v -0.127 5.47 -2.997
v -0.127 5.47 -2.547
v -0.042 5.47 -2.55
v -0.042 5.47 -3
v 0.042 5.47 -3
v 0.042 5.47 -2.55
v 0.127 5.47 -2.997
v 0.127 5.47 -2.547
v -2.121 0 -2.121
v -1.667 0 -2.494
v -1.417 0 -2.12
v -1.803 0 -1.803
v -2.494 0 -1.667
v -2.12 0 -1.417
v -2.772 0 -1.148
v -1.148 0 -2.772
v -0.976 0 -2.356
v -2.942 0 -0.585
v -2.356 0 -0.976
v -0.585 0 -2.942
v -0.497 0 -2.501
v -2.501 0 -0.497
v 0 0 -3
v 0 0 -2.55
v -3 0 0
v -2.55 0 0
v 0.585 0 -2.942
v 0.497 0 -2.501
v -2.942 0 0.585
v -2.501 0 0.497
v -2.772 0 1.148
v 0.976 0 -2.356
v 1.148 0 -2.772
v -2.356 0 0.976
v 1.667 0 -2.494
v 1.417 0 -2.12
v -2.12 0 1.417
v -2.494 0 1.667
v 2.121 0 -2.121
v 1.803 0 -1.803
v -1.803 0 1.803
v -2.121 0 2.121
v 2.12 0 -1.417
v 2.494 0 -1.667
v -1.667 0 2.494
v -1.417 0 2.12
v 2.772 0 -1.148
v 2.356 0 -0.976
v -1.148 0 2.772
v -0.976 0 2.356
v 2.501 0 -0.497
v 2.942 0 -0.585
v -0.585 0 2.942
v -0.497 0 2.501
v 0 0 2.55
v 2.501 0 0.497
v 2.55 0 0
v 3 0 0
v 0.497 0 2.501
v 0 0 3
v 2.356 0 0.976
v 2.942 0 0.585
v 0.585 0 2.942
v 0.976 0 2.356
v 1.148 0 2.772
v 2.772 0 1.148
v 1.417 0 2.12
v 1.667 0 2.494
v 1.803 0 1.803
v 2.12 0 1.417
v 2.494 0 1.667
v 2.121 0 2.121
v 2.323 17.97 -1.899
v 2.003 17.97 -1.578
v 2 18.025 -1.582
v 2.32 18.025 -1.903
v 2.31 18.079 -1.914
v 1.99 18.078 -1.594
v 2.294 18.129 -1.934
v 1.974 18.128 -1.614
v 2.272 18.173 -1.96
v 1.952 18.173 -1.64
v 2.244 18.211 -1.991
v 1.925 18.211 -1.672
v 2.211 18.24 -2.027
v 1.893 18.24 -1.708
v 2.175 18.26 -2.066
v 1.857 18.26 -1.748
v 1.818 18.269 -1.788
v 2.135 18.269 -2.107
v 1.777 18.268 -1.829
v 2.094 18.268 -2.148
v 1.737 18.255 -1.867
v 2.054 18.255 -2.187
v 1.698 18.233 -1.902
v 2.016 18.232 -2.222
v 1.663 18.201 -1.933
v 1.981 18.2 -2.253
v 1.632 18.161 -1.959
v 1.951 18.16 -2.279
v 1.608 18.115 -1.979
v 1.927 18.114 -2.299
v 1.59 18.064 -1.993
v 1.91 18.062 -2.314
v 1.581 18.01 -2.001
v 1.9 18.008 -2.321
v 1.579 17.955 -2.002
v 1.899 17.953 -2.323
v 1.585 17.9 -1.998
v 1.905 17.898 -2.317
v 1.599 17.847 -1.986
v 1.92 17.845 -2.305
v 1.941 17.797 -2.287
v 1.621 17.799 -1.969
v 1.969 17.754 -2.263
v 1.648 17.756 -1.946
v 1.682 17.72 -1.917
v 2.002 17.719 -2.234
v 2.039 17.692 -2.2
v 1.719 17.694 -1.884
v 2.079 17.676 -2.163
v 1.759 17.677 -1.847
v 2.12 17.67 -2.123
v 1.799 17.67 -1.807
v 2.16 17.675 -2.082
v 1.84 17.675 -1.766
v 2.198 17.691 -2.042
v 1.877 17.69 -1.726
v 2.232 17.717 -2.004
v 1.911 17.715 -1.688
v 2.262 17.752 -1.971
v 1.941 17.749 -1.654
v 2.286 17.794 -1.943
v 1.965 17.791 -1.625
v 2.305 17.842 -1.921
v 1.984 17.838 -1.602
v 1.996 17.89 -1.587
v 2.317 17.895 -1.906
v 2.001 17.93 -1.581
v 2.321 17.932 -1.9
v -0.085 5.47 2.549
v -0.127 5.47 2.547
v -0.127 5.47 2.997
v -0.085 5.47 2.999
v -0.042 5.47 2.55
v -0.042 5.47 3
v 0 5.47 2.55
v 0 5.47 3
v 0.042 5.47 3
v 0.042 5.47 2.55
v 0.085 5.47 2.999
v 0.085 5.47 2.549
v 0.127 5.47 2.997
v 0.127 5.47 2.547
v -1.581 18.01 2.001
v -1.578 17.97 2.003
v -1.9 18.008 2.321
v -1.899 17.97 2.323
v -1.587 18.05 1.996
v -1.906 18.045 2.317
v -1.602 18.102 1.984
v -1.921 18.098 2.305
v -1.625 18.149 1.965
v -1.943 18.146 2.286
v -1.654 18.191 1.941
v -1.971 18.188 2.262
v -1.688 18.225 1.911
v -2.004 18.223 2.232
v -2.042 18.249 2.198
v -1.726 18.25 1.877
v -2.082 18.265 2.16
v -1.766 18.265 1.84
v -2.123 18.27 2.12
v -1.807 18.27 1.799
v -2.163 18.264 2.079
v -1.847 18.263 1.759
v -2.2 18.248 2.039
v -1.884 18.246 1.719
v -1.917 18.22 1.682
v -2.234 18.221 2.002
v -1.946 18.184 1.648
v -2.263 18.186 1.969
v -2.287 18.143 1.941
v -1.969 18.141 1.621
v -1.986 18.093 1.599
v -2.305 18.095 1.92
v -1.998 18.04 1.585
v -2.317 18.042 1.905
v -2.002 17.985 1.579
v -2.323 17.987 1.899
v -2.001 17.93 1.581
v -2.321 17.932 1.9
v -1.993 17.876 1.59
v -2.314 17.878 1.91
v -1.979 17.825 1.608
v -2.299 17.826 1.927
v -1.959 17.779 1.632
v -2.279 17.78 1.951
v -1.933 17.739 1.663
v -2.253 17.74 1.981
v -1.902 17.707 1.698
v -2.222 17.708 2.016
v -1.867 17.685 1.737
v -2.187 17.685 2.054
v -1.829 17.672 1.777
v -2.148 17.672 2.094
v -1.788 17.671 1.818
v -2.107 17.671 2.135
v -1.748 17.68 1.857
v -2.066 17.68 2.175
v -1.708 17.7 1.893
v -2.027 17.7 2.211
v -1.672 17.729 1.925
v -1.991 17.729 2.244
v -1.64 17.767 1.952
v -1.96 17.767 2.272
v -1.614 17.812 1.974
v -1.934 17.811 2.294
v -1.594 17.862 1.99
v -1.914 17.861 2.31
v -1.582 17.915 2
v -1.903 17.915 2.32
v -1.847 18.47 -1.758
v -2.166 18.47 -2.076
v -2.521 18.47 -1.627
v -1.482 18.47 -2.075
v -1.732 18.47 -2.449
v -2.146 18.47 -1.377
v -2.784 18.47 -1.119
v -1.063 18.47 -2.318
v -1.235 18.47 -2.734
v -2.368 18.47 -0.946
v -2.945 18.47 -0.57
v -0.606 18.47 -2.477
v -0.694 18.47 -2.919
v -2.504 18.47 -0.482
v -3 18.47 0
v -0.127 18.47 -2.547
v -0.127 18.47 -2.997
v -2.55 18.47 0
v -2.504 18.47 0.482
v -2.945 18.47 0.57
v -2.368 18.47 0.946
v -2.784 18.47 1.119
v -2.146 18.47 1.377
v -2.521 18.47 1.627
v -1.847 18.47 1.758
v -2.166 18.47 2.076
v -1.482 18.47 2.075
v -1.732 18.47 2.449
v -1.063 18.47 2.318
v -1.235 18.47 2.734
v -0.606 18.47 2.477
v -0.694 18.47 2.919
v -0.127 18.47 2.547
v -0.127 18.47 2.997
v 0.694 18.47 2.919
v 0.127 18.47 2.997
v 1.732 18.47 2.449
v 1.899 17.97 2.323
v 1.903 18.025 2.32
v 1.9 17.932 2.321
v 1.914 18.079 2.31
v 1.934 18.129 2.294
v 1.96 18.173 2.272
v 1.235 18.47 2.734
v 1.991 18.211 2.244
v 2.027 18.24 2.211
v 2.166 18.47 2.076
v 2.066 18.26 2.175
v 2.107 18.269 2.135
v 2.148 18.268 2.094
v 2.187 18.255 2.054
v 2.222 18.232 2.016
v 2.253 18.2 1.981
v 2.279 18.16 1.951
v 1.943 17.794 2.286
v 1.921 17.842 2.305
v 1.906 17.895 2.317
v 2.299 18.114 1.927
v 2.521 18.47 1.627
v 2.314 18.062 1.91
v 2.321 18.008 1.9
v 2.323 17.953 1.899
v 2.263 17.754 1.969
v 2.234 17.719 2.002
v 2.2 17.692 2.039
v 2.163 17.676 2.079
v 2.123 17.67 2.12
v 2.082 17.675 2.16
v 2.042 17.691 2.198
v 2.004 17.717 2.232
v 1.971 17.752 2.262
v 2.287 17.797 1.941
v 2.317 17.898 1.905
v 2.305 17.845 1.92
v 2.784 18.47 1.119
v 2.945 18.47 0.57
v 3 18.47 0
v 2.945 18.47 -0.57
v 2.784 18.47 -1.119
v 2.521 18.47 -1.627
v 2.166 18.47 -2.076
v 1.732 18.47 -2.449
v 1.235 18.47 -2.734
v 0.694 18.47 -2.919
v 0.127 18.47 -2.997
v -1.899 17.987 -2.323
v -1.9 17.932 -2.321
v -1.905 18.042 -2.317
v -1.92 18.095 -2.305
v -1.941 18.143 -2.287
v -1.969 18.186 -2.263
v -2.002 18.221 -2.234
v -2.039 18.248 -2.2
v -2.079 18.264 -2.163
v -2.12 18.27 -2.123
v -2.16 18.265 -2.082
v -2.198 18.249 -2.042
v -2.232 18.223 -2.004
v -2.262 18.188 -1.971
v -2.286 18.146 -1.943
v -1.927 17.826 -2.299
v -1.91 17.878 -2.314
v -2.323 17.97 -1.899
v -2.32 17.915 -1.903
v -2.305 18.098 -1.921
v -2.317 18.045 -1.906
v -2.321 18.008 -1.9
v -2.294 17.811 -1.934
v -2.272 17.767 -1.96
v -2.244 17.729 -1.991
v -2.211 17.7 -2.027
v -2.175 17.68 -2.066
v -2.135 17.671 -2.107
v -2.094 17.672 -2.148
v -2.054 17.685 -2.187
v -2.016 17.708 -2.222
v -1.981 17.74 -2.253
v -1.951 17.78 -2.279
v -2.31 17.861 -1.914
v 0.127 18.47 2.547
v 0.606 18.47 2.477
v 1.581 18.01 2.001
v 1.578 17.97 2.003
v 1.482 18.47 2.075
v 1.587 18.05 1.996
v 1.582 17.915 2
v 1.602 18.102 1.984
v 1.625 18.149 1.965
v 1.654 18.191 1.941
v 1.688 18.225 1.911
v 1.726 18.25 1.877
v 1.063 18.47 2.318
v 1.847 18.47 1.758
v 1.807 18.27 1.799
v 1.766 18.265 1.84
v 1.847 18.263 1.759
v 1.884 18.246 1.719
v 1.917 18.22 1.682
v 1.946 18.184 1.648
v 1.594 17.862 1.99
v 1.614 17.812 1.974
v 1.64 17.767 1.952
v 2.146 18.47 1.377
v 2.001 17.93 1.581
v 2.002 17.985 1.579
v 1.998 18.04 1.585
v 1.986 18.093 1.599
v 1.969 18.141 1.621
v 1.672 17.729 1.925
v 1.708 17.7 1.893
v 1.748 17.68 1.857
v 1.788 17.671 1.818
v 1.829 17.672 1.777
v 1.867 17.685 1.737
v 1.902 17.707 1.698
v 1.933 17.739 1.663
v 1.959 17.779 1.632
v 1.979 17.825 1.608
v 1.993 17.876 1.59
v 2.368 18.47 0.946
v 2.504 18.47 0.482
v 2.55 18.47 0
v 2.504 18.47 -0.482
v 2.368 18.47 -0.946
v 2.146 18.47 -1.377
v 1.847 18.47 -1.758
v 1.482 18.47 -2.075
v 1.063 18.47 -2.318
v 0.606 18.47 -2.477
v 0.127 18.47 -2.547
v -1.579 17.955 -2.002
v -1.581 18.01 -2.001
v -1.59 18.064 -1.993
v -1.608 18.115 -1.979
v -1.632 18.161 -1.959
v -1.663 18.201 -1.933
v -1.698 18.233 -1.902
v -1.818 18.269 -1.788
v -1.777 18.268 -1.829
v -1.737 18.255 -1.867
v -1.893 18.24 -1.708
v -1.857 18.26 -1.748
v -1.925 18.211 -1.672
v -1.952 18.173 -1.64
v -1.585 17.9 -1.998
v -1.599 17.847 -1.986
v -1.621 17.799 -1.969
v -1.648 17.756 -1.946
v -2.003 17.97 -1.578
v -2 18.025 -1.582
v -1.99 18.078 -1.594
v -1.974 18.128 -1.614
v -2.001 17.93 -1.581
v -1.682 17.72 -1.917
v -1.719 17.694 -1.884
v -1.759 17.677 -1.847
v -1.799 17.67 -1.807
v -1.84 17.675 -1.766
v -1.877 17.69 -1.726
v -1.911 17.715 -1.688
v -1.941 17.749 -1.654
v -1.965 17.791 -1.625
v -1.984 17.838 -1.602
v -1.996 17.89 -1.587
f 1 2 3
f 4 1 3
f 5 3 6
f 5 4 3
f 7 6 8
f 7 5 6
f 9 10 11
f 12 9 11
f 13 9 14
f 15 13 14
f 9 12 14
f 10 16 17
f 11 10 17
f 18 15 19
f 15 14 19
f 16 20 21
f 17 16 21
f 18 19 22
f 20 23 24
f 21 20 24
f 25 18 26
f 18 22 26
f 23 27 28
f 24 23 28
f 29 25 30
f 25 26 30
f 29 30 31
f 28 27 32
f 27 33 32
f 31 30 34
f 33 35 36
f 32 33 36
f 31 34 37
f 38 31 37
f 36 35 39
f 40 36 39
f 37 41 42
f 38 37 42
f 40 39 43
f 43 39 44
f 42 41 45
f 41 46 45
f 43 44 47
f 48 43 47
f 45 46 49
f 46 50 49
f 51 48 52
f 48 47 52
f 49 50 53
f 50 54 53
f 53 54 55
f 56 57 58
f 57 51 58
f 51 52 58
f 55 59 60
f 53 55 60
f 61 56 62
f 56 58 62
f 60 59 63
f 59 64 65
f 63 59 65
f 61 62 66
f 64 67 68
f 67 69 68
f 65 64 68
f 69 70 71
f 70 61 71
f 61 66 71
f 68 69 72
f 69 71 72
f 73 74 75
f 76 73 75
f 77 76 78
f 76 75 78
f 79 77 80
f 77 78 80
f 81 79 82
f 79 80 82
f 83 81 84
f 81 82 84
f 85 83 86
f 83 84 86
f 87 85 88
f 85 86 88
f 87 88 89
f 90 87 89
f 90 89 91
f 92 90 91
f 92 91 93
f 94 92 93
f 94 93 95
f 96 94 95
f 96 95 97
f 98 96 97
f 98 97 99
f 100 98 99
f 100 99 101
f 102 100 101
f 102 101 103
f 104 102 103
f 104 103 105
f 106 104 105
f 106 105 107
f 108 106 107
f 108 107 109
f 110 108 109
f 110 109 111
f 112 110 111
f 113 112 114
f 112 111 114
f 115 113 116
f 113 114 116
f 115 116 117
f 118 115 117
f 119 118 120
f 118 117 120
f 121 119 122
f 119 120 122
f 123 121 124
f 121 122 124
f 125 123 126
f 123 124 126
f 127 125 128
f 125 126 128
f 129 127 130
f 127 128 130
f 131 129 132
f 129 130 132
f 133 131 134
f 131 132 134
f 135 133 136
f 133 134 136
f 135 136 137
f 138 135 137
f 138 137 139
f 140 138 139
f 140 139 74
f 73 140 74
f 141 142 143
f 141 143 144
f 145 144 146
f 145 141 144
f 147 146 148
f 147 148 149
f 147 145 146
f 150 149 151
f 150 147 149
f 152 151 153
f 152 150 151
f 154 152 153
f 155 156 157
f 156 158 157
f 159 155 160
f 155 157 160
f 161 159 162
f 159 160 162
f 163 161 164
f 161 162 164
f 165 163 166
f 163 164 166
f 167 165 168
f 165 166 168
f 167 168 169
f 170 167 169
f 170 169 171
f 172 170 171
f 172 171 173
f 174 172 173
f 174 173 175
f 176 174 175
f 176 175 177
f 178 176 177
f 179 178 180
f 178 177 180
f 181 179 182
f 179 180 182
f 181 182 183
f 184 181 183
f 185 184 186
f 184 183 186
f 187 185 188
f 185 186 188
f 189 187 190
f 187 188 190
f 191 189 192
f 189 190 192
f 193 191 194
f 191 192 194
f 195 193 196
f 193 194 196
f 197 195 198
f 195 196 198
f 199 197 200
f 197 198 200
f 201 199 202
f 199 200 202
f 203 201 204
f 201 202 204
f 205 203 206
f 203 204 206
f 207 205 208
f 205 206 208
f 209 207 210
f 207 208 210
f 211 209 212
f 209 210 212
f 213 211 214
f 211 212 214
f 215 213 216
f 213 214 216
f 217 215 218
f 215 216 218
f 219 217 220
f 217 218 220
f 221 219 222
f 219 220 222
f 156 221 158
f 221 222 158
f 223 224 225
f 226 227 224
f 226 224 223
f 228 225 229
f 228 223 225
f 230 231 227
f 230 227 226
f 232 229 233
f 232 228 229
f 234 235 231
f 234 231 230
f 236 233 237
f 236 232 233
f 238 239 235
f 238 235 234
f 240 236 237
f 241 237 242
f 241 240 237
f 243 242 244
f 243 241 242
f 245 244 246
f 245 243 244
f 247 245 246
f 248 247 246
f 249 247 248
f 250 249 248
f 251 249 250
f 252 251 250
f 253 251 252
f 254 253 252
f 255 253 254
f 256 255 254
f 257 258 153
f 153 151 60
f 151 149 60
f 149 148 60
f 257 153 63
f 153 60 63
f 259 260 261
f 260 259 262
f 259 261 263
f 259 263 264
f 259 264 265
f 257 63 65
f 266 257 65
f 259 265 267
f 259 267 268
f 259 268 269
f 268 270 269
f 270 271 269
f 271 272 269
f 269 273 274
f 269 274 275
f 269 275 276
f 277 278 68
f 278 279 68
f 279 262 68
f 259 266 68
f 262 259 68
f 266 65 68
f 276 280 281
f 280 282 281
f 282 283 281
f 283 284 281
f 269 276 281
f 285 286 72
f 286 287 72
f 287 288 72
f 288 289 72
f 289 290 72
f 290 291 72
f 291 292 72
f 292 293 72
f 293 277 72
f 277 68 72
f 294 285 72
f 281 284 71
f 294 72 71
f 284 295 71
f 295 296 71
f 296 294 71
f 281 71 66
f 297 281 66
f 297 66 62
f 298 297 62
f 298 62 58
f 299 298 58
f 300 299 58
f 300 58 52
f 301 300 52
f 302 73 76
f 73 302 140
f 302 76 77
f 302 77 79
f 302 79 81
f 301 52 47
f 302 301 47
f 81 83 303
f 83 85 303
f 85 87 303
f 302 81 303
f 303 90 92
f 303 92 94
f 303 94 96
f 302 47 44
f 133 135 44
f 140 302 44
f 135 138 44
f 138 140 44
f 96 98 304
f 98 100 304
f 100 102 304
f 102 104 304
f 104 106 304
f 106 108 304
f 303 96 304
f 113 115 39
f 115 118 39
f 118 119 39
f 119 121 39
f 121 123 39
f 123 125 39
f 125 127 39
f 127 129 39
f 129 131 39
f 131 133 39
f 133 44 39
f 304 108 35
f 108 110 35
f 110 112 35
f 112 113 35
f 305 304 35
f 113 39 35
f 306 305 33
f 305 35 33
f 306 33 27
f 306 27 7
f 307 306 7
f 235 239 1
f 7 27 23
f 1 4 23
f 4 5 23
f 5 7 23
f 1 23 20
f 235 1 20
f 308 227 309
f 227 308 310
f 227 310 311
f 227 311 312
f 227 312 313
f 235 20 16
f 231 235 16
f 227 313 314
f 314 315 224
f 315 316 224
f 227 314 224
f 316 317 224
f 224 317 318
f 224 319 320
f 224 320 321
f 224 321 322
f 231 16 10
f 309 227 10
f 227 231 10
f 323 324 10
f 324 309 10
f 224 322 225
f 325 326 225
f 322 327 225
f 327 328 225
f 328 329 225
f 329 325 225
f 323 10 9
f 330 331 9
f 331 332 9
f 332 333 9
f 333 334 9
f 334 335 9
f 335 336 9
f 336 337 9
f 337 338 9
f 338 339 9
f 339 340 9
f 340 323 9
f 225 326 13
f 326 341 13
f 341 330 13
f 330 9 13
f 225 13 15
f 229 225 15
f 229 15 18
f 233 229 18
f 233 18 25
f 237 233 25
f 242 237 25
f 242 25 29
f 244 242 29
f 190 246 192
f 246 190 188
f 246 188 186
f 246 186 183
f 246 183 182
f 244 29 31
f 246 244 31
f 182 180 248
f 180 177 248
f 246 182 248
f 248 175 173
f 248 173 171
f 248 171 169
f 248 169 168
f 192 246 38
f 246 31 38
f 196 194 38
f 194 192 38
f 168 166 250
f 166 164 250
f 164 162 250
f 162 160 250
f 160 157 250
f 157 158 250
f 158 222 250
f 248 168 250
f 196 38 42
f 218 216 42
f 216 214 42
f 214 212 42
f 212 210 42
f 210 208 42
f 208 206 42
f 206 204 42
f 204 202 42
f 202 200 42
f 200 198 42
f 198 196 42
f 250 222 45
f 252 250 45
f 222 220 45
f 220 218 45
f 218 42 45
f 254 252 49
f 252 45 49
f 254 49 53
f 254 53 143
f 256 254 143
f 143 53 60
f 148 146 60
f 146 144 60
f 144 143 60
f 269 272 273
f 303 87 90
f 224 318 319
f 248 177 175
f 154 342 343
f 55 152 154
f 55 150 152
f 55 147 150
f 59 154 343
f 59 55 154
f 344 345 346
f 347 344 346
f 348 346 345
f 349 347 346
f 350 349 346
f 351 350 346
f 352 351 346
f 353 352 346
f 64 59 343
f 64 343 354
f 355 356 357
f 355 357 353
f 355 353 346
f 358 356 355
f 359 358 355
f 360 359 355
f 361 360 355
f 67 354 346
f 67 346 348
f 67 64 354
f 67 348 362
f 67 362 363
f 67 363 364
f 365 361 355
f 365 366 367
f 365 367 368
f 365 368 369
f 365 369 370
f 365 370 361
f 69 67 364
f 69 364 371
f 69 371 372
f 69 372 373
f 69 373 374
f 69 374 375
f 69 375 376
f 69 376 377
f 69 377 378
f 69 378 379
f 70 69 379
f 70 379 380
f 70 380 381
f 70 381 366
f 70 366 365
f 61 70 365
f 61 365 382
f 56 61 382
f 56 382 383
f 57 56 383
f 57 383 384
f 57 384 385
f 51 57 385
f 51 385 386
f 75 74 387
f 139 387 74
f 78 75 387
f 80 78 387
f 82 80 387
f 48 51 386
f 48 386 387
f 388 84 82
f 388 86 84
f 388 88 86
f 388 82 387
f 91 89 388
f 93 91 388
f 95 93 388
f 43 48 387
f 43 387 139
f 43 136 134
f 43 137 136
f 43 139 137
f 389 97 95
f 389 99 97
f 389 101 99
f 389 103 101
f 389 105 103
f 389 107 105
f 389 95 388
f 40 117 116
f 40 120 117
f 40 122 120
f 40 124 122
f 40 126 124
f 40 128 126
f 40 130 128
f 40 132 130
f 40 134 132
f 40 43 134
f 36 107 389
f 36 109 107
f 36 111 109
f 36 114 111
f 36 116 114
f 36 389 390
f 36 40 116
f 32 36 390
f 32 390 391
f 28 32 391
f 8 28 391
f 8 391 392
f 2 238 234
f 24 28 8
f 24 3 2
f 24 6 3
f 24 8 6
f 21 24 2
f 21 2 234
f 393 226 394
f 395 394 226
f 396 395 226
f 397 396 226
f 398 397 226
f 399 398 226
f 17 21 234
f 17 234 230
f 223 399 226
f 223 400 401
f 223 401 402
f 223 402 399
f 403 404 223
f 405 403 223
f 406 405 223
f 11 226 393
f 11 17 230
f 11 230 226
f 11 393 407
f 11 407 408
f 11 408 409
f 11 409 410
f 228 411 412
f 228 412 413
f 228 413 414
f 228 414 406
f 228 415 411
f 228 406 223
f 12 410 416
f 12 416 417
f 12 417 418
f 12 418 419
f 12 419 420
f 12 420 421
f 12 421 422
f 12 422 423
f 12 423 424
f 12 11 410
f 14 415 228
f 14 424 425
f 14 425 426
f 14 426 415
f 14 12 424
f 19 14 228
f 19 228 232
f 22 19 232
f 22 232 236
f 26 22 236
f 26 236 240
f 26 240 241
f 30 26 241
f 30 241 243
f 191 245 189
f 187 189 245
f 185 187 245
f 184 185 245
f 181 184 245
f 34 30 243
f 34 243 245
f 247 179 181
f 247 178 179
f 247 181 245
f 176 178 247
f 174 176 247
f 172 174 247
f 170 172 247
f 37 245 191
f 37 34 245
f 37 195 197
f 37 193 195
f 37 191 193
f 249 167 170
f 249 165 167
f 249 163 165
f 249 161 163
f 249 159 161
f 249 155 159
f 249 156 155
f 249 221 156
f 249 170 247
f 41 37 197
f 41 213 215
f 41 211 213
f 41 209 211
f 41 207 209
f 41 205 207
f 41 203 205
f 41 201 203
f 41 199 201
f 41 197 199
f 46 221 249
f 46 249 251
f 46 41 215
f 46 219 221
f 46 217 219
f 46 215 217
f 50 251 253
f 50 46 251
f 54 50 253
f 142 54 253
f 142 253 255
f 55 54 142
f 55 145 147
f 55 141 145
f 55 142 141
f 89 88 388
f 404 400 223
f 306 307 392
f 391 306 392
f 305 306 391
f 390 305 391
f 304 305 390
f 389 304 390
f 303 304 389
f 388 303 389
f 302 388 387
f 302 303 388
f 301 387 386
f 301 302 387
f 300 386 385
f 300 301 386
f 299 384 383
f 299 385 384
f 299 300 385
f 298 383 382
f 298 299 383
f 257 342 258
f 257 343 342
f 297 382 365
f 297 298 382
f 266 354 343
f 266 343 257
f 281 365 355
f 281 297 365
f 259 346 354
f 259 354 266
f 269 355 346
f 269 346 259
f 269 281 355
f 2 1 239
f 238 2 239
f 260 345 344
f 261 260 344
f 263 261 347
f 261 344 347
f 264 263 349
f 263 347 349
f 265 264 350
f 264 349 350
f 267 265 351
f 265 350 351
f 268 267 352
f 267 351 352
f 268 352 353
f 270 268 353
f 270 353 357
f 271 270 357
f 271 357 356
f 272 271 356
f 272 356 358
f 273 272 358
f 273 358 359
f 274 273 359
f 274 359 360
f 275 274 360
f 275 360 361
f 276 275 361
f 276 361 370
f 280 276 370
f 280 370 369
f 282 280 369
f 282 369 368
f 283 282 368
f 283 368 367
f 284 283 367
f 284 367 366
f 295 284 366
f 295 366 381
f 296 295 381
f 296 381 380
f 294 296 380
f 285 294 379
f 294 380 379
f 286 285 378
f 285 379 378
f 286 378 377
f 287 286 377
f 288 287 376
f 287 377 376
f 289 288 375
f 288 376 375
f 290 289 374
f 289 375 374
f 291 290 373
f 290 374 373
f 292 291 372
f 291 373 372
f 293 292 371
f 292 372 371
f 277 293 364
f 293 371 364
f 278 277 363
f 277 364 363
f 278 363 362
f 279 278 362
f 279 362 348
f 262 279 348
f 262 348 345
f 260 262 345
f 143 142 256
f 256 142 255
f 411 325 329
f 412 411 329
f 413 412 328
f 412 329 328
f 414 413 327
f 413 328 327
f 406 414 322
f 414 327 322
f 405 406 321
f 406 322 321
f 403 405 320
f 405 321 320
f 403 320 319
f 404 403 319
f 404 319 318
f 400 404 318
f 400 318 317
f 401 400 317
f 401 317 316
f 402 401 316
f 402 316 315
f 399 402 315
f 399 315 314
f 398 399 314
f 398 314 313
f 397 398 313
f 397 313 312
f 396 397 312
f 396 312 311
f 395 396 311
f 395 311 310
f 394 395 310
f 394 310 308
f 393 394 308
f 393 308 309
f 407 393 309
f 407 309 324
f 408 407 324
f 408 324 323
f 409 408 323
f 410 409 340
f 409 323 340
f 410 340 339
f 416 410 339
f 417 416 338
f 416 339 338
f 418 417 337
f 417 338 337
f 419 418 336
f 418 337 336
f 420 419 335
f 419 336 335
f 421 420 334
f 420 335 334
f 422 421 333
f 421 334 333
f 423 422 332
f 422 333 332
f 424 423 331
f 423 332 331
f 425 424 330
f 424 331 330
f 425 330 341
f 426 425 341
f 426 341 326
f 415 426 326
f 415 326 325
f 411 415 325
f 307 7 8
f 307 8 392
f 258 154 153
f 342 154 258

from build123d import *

# Parameters (mm, degrees)
SKETCH1_R                            = 3
SKETCH1_R_2                          = 2.55
BOSS_EXTRUDE1_DEPTH                  = 18.47
CUT_EXTRUDE1_DEPTH                   = 19.951013166
CUT_EXTRUDE1_DEPTH_BACK              = 19.951013166
SKETCH2_W                            = 0.254
SKETCH2_H                            = 13
F_0_6_0_6_DIAMETER_HOLE1_D           = 0.6
F_0_6_0_6_DIAMETER_HOLE1_ON_FACE_2_D = 0.6
F_0_6_0_6_DIAMETER_HOLE1_ON_FACE_3_D = 0.6
F_0_6_0_6_DIAMETER_HOLE1_ON_FACE_4_D = 0.6


with BuildPart() as part:
    # Sketch1 → Boss-Extrude1 (new body)
    with BuildSketch(Plane(origin=(0, 0, 0), x_dir=(1, 0, 0), z_dir=(0, 1, 0))):
        with Locations(Location((0, 0, 0), (0, 0, 270))):
            Circle(SKETCH1_R)
        with Locations(Location((0, 0, 0), (0, 0, 270))):
            Circle(SKETCH1_R_2, mode=Mode.SUBTRACT)
    extrude(amount=BOSS_EXTRUDE1_DEPTH)

    # Sketch2 → Cut-Extrude1 (cut, two sides: drawn at the far end of the back side and taken through both)
    with BuildSketch(Plane.XY.offset(-CUT_EXTRUDE1_DEPTH_BACK)):
        with Locations((0, 11.97)):
            Rectangle(SKETCH2_W, SKETCH2_H)
    extrude(amount=CUT_EXTRUDE1_DEPTH + CUT_EXTRUDE1_DEPTH_BACK, mode=Mode.SUBTRACT)

    # Ø0.6 (0.6) Diameter Hole1 (through all)
    with Locations(Plane(origin=(2.121320344, 17.97, 2.121320344), x_dir=(0.707106781187, 0, -0.707106781187), z_dir=(0.707106781187, 0, 0.707106781187))):
        with Locations((0, 0)):
            Hole(F_0_6_0_6_DIAMETER_HOLE1_D / 2)

    # Ø0.6 (0.6) Diameter Hole1 on face 2 (through all)
    with Locations(Plane(origin=(2.121320344, 17.97, -2.121320344), x_dir=(-0.707106781187, 0, -0.707106781187), z_dir=(0.707106781187, 0, -0.707106781187))):
        with Locations((0, 0)):
            Hole(F_0_6_0_6_DIAMETER_HOLE1_ON_FACE_2_D / 2)

    # Ø0.6 (0.6) Diameter Hole1 on face 3 (through all)
    with Locations(Plane(origin=(-2.121320344, 17.97, 2.121320344), x_dir=(0.707106781187, 0, 0.707106781187), z_dir=(-0.707106781187, 0, 0.707106781187))):
        with Locations((0, 0)):
            Hole(F_0_6_0_6_DIAMETER_HOLE1_ON_FACE_3_D / 2)

    # Ø0.6 (0.6) Diameter Hole1 on face 4 (through all)
    with Locations(Plane(origin=(-2.121320344, 17.97, -2.121320344), x_dir=(-0.707106781187, 0, 0.707106781187), z_dir=(-0.707106781187, 0, -0.707106781187))):
        with Locations((0, 0)):
            Hole(F_0_6_0_6_DIAMETER_HOLE1_ON_FACE_4_D / 2)


solid = part.part
